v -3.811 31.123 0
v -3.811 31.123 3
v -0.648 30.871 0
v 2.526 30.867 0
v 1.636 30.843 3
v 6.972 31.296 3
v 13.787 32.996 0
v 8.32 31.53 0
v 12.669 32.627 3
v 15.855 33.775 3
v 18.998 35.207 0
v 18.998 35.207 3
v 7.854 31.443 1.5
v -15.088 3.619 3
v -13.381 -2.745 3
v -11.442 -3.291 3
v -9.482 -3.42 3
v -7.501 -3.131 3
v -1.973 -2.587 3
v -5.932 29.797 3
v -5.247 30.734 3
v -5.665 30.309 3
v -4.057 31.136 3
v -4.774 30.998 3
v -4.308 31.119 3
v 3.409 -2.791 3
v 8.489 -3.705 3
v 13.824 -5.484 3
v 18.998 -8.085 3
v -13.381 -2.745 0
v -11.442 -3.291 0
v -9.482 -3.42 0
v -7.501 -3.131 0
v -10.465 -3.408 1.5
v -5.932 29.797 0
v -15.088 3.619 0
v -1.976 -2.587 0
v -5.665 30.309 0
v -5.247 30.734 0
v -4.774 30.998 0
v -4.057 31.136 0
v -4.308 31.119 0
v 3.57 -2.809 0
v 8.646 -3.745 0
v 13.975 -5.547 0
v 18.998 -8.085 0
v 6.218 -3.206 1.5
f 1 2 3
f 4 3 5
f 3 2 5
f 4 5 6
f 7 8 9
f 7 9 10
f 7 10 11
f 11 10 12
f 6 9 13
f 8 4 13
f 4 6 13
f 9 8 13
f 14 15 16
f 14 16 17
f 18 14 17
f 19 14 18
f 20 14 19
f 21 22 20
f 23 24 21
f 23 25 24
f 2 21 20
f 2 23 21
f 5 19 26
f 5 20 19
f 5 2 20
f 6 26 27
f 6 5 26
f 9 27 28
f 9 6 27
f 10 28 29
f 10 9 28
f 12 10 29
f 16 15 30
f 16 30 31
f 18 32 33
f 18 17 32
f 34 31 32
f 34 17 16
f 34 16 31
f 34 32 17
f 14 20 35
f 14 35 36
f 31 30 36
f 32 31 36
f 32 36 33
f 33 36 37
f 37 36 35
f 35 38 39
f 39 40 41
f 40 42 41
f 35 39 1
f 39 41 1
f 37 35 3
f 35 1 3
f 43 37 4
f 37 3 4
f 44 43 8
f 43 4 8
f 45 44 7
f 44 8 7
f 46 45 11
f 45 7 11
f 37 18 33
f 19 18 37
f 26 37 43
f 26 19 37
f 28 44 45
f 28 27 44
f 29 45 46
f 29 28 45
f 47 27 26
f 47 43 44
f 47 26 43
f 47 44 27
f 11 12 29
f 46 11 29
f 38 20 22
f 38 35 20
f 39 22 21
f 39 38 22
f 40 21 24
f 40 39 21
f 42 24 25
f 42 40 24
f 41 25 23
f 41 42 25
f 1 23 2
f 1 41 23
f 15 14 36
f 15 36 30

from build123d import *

# Parameters (mm, degrees)
EXTRUDE_1_DEPTH      = 3
EXTRUDE_2_DEPTH      = 3
CUT_EXTRUDE_1_DEPTH  = 10
CUT_EXTRUDE_2_DEPTH  = 10
FILLET_1_R           = 2
CUT_EXTRUDE_3_DEPTH  = 10
CUT_EXTRUDE_4_DEPTH  = 10
CUT_EXTRUDE_5_DEPTH  = 10
CUT_EXTRUDE_6_DEPTH  = 10
CUT_EXTRUDE_7_DEPTH  = 10
EXTRUDE_3_DEPTH      = 3
EXTRUDE_4_DEPTH      = 3
EXTRUDE_5_DEPTH      = 3
CUT_EXTRUDE_8_DEPTH  = 10
CUT_EXTRUDE_9_DEPTH  = 10
CUT_EXTRUDE_10_DEPTH = 10
EXTRUDE_7_DEPTH      = 3
CUT_EXTRUDE_11_DEPTH = 10
CUT_EXTRUDE_12_DEPTH = 10
CUT_EXTRUDE_13_DEPTH = 10
FILLET_2_R           = 2


with BuildPart() as part:
    # 草图1 → 凸台-拉伸1 (new body)
    with BuildSketch(Plane.XY):
        Polygon((18.419709666, -31.180034248), (-18.99770992, -2.648675004), (-11.516544217, 31.616418832), (-4.12729008, 31.616418832), (18.99770992, 31.616418832), (18.99770992, -31.616418832), align=None)
    extrude(amount=EXTRUDE_1_DEPTH)

    # 草图2 → 凸台-拉伸2 (add)
    with BuildSketch(Plane.XY.offset(3)):
        Polygon((18.99770992, 31.616418832), (18.99770992, 39.616418832), (-11.516544217, 31.616418832), align=None)
    extrude(amount=-EXTRUDE_2_DEPTH)

    # 草图3 → 切除-拉伸1 (cut)
    with BuildSketch(Plane.XY.offset(3)):
        with BuildLine():
            Line((-18.99770992, -2.648675004), (18.419709666, -31.180034248))
            Line((18.419709666, -31.180034248), (18.99770992, -31.616418832))
            add(Edge.make_bspline(
                [(-18.99770992, -2.648675004), (-4.909401081, -6.664762391), (12.96021978, -16.653979791), (18.99770992, -31.616418832)],
                knots=[0, 0, 0, 0, 0.839418351, 0.839418351, 0.839418351, 0.839418351], degree=3))
        make_face()
    extrude(amount=-CUT_EXTRUDE_1_DEPTH, mode=Mode.SUBTRACT)

    # 草图4 → 切除-拉伸2 (cut)
    with BuildSketch(Plane.XY.offset(3)):
        with BuildLine():
            Line((18.99770992, 39.616418832), (-11.516544217, 31.616418832))
            add(Edge.make_bspline(
                [(-11.516544217, 31.616418832), (5.451208804, 29.787696143), (18.99770992, 39.616418832)],
                knots=[0, 0, 0, 1, 1, 1], degree=2))
        make_face()
    extrude(amount=-CUT_EXTRUDE_2_DEPTH, mode=Mode.SUBTRACT)

    # 圆角1
    fillet_1_edges = [part.edges().sort_by_distance(p)[0] for p in [
        (-11.516544217, 31.616418832, 1.5),
        (-18.99770992, -2.648675004, 1.5),
    ]]
    fillet(fillet_1_edges, radius=FILLET_1_R)

    # 草图5 → 切除-拉伸3 (cut)
    with BuildSketch(Plane.XY.offset(3)):
        with BuildLine():
            Line((-15.247678714, 14.527147092), (-18.602325656, -0.837743464))
            ThreePointArc((-18.602325656, -0.837743464), (-18.37793511, -2.26862535), (-17.246477615, -3.172825565))
            add(Edge.make_bspline(
                [(-5.349580984, -8.035622202), (-9.34088255, -6.003793842), (-13.405831379, -4.376501244), (-17.246477615, -3.172825565)],
                knots=[0.580679004, 0.580679004, 0.580679004, 0.580679004, 0.804994854, 0.804994854, 0.804994854, 0.804994854], degree=3))
            Line((-5.349580984, -8.035622202), (-15.247678714, 14.527147092))
        make_face()
    extrude(amount=-CUT_EXTRUDE_3_DEPTH, mode=Mode.SUBTRACT)

    # 草图6 → 切除-拉伸4 (cut)
    with BuildSketch(Plane.XY.offset(3)):
        with BuildLine():
            Line((18.99770992, -31.616418832), (18.99770992, -24.041974817))
            add(Edge.make_bspline(
                [(-5.349580984, -8.035622202), (10.712822768, -10.603879461), (18.99770992, -24.041974817)],
                knots=[0, 0, 0, 1, 1, 1], degree=2))
            add(Edge.make_bspline(
                [(18.99770992, -31.616418832), (14.821194408, -21.265949132), (4.982569087, -13.295348934), (-5.349580984, -8.035622202)],
                knots=[0, 0, 0, 0, 0.580679004, 0.580679004, 0.580679004, 0.580679004], degree=3))
        make_face()
    extrude(amount=-CUT_EXTRUDE_4_DEPTH, mode=Mode.SUBTRACT)

    # 草图7 → 切除-拉伸5 (cut)
    with BuildSketch(Plane.XY.offset(3)):
        with BuildLine():
            Line((-7.501131826, -3.13114999), (-5.349580984, -8.035622202))
            add(Edge.make_bspline(
                [(18.99770992, -24.041974817), (10.712822768, -10.603879461), (-5.349580984, -8.035622202)],
                knots=[0, 0, 0, 1, 1, 1], degree=2))
            Line((18.99770992, -24.041974817), (18.99770992, -15.72868914))
            add(Edge.make_bspline(
                [(-7.501131826, -3.13114999), (8.534248318, -3.706395951), (18.99770992, -15.72868914)],
                knots=[0, 0, 0, 1, 1, 1], degree=2))
        make_face()
    extrude(amount=-CUT_EXTRUDE_5_DEPTH, mode=Mode.SUBTRACT)

    # 草图9 → 切除-拉伸6 (cut)
    with BuildSketch(Plane.XY.offset(3)):
        with BuildLine():
            Line((-15.247678714, 14.527147092), (-5.393109321, 31.338029381))
            add(Edge.make_bspline(
                [(-9.792557358, 31.460050353), (-7.562671253, 31.296266706), (-5.393109321, 31.338029381)],
                knots=[0, 0, 0, 1, 1, 1], degree=2))
            ThreePointArc((-9.792557358, 31.460050353), (-11.135472525, 31.068108787), (-11.893031771, 29.892037648))
            Line((-11.893031771, 29.892037648), (-15.247678714, 14.527147092))
        make_face()
    extrude(amount=-CUT_EXTRUDE_6_DEPTH, mode=Mode.SUBTRACT)

    # 草图10 → 切除-拉伸7 (cut)
    with BuildSketch(Plane.XY.offset(3)):
        Polygon((-15.247678714, 14.527147092), (-5.393109321, 31.338029381), (-13.423981873, 10.370019914), align=None)
    extrude(amount=-CUT_EXTRUDE_7_DEPTH, mode=Mode.SUBTRACT)

    # 草图11 → 凸台-拉伸3 (add)
    with BuildSketch(Plane.XY.offset(3)):
        Polygon((-13.423981873, 3.619434962), (-7.501131826, -3.13114999), (-13.423981873, 10.370019914), align=None)
        Polygon((-13.423981873, 16.619434962), (-13.423981873, 10.370019914), (-5.393109321, 31.338029381), align=None)
    extrude(amount=-EXTRUDE_3_DEPTH)

    # 草图12 → 凸台-拉伸4 (add)
    with BuildSketch(Plane.XY.offset(3)):
        with BuildLine():
            Line((18.99770992, -15.72868914), (18.99770992, -16.37868914))
            add(Edge.make_bspline(
                [(-7.501131826, -3.13114999), (8.231572952, -4.86202672), (18.99770992, -16.37868914)],
                knots=[0, 0, 0, 1, 1, 1], degree=2))
            add(Edge.make_bspline(
                [(-7.501131826, -3.13114999), (8.534248318, -3.706395951), (18.99770992, -15.72868914)],
                knots=[0, 0, 0, 1, 1, 1], degree=2))
        make_face()
    extrude(amount=-EXTRUDE_4_DEPTH)

    # 草图14 → 凸台-拉伸5 (add)
    with BuildSketch(Plane.XY.offset(3)):
        Polygon((-13.423981873, 16.619434962), (-5.393109321, 31.338029381), (-15.088083527, 18.619208438), (-15.088083527, 3.619434962), (-7.501131826, -3.13114999), (-13.423981873, 3.619434962), align=None)
    extrude(amount=-EXTRUDE_5_DEPTH)

    # 草图15 → 切除-拉伸8 (cut)
    with BuildSketch(Plane.XY.offset(3)):
        Polygon((-5.393109321, 31.338029381), (-15.088083527, 18.619208438), (-15.088083527, 14.468365238), align=None)
    extrude(amount=-CUT_EXTRUDE_8_DEPTH, mode=Mode.SUBTRACT)

    # 草图16 → 切除-拉伸9 (cut)
    with BuildSketch(Plane.XY.offset(3)):
        with BuildLine():
            Line((18.99770992, -16.37868914), (18.99770992, -10.902642973))
            add(Edge.make_bspline(
                [(-7.501131826, -3.13114999), (7.093543529, -2.593480943), (18.99770992, -10.902642973)],
                knots=[0, 0, 0, 1, 1, 1], degree=2))
            add(Edge.make_bspline(
                [(-7.501131826, -3.13114999), (8.231572952, -4.86202672), (18.99770992, -16.37868914)],
                knots=[0, 0, 0, 1, 1, 1], degree=2))
        make_face()
    extrude(amount=-CUT_EXTRUDE_9_DEPTH, mode=Mode.SUBTRACT)

    # 草图17 → 切除-拉伸10 (cut)
    with BuildSketch(Plane.XY.offset(3)):
        with BuildLine():
            Line((18.99770992, -10.902642973), (18.99770992, -8.085223828))
            add(Edge.make_bspline(
                [(-7.501131826, -3.13114999), (6.687210299, -0.804092069), (18.99770992, -8.085223828)],
                knots=[0, 0, 0, 1, 1, 1], degree=2))
            add(Edge.make_bspline(
                [(18.99770992, -10.902642973), (7.093543529, -2.593480943), (-7.501131826, -3.13114999)],
                knots=[0, 0, 0, 1, 1, 1], degree=2))
        make_face()
    extrude(amount=-CUT_EXTRUDE_10_DEPTH, mode=Mode.SUBTRACT)

    # 草图18 → 凸台-拉伸7 (add)
    with BuildSketch(Plane.XY.offset(3)):
        with BuildLine():
            Line((-15.088083527, 3.619434962), (-13.3809595, -2.744921014))
            add(Edge.make_bspline(
                [(-13.3809595, -2.744921014), (-10.489009144, -3.877027088), (-7.501131826, -3.13114999)],
                knots=[0, 0, 0, 1, 1, 1], degree=2))
            Line((-7.501131826, -3.13114999), (-15.088083527, 3.619434962))
        make_face()
    extrude(amount=-EXTRUDE_7_DEPTH)

    # 草图19 → 切除-拉伸11 (cut)
    with BuildSketch(Plane.XY.offset(3)):
        Polygon((-13.593259145, 17.069422728), (-15.088083527, 14.468365238), (-15.088083527, 11.468365238), align=None)
    extrude(amount=-CUT_EXTRUDE_11_DEPTH, mode=Mode.SUBTRACT)

    # 草图20 → 切除-拉伸12 (cut)
    with BuildSketch(Plane.XY.offset(3)):
        with BuildLine():
            Line((18.99770992, 35.207268429), (18.99770992, 39.616418832))
            add(Edge.make_bspline(
                [(-5.393109321, 31.338029381), (7.941746813, 31.594716807), (18.99770992, 39.616418832)],
                knots=[0, 0, 0, 1, 1, 1], degree=2))
            add(Edge.make_bspline(
                [(-5.393109321, 31.338029381), (7.395374053, 29.358468499), (18.99770992, 35.207268429)],
                knots=[0, 0, 0, 1, 1, 1], degree=2))
        make_face()
    extrude(amount=-CUT_EXTRUDE_12_DEPTH, mode=Mode.SUBTRACT)

    # 草图22 → 切除-拉伸13 (cut)
    with BuildSketch(Plane.XY.offset(3)):
        Polygon((-5.393109324, 31.338029381), (-15.088083527, 3.619434962), (-15.088083527, 11.468365238), (-13.593259145, 17.069422728), align=None)
    extrude(amount=-CUT_EXTRUDE_13_DEPTH, mode=Mode.SUBTRACT)

    # 圆角2
    fillet_2_edges = [part.edges().sort_by_distance(p)[0] for p in [
        (-5.393109321, 31.338029381, 1.5),
    ]]
    fillet(fillet_2_edges, radius=FILLET_2_R)


solid = part.part
